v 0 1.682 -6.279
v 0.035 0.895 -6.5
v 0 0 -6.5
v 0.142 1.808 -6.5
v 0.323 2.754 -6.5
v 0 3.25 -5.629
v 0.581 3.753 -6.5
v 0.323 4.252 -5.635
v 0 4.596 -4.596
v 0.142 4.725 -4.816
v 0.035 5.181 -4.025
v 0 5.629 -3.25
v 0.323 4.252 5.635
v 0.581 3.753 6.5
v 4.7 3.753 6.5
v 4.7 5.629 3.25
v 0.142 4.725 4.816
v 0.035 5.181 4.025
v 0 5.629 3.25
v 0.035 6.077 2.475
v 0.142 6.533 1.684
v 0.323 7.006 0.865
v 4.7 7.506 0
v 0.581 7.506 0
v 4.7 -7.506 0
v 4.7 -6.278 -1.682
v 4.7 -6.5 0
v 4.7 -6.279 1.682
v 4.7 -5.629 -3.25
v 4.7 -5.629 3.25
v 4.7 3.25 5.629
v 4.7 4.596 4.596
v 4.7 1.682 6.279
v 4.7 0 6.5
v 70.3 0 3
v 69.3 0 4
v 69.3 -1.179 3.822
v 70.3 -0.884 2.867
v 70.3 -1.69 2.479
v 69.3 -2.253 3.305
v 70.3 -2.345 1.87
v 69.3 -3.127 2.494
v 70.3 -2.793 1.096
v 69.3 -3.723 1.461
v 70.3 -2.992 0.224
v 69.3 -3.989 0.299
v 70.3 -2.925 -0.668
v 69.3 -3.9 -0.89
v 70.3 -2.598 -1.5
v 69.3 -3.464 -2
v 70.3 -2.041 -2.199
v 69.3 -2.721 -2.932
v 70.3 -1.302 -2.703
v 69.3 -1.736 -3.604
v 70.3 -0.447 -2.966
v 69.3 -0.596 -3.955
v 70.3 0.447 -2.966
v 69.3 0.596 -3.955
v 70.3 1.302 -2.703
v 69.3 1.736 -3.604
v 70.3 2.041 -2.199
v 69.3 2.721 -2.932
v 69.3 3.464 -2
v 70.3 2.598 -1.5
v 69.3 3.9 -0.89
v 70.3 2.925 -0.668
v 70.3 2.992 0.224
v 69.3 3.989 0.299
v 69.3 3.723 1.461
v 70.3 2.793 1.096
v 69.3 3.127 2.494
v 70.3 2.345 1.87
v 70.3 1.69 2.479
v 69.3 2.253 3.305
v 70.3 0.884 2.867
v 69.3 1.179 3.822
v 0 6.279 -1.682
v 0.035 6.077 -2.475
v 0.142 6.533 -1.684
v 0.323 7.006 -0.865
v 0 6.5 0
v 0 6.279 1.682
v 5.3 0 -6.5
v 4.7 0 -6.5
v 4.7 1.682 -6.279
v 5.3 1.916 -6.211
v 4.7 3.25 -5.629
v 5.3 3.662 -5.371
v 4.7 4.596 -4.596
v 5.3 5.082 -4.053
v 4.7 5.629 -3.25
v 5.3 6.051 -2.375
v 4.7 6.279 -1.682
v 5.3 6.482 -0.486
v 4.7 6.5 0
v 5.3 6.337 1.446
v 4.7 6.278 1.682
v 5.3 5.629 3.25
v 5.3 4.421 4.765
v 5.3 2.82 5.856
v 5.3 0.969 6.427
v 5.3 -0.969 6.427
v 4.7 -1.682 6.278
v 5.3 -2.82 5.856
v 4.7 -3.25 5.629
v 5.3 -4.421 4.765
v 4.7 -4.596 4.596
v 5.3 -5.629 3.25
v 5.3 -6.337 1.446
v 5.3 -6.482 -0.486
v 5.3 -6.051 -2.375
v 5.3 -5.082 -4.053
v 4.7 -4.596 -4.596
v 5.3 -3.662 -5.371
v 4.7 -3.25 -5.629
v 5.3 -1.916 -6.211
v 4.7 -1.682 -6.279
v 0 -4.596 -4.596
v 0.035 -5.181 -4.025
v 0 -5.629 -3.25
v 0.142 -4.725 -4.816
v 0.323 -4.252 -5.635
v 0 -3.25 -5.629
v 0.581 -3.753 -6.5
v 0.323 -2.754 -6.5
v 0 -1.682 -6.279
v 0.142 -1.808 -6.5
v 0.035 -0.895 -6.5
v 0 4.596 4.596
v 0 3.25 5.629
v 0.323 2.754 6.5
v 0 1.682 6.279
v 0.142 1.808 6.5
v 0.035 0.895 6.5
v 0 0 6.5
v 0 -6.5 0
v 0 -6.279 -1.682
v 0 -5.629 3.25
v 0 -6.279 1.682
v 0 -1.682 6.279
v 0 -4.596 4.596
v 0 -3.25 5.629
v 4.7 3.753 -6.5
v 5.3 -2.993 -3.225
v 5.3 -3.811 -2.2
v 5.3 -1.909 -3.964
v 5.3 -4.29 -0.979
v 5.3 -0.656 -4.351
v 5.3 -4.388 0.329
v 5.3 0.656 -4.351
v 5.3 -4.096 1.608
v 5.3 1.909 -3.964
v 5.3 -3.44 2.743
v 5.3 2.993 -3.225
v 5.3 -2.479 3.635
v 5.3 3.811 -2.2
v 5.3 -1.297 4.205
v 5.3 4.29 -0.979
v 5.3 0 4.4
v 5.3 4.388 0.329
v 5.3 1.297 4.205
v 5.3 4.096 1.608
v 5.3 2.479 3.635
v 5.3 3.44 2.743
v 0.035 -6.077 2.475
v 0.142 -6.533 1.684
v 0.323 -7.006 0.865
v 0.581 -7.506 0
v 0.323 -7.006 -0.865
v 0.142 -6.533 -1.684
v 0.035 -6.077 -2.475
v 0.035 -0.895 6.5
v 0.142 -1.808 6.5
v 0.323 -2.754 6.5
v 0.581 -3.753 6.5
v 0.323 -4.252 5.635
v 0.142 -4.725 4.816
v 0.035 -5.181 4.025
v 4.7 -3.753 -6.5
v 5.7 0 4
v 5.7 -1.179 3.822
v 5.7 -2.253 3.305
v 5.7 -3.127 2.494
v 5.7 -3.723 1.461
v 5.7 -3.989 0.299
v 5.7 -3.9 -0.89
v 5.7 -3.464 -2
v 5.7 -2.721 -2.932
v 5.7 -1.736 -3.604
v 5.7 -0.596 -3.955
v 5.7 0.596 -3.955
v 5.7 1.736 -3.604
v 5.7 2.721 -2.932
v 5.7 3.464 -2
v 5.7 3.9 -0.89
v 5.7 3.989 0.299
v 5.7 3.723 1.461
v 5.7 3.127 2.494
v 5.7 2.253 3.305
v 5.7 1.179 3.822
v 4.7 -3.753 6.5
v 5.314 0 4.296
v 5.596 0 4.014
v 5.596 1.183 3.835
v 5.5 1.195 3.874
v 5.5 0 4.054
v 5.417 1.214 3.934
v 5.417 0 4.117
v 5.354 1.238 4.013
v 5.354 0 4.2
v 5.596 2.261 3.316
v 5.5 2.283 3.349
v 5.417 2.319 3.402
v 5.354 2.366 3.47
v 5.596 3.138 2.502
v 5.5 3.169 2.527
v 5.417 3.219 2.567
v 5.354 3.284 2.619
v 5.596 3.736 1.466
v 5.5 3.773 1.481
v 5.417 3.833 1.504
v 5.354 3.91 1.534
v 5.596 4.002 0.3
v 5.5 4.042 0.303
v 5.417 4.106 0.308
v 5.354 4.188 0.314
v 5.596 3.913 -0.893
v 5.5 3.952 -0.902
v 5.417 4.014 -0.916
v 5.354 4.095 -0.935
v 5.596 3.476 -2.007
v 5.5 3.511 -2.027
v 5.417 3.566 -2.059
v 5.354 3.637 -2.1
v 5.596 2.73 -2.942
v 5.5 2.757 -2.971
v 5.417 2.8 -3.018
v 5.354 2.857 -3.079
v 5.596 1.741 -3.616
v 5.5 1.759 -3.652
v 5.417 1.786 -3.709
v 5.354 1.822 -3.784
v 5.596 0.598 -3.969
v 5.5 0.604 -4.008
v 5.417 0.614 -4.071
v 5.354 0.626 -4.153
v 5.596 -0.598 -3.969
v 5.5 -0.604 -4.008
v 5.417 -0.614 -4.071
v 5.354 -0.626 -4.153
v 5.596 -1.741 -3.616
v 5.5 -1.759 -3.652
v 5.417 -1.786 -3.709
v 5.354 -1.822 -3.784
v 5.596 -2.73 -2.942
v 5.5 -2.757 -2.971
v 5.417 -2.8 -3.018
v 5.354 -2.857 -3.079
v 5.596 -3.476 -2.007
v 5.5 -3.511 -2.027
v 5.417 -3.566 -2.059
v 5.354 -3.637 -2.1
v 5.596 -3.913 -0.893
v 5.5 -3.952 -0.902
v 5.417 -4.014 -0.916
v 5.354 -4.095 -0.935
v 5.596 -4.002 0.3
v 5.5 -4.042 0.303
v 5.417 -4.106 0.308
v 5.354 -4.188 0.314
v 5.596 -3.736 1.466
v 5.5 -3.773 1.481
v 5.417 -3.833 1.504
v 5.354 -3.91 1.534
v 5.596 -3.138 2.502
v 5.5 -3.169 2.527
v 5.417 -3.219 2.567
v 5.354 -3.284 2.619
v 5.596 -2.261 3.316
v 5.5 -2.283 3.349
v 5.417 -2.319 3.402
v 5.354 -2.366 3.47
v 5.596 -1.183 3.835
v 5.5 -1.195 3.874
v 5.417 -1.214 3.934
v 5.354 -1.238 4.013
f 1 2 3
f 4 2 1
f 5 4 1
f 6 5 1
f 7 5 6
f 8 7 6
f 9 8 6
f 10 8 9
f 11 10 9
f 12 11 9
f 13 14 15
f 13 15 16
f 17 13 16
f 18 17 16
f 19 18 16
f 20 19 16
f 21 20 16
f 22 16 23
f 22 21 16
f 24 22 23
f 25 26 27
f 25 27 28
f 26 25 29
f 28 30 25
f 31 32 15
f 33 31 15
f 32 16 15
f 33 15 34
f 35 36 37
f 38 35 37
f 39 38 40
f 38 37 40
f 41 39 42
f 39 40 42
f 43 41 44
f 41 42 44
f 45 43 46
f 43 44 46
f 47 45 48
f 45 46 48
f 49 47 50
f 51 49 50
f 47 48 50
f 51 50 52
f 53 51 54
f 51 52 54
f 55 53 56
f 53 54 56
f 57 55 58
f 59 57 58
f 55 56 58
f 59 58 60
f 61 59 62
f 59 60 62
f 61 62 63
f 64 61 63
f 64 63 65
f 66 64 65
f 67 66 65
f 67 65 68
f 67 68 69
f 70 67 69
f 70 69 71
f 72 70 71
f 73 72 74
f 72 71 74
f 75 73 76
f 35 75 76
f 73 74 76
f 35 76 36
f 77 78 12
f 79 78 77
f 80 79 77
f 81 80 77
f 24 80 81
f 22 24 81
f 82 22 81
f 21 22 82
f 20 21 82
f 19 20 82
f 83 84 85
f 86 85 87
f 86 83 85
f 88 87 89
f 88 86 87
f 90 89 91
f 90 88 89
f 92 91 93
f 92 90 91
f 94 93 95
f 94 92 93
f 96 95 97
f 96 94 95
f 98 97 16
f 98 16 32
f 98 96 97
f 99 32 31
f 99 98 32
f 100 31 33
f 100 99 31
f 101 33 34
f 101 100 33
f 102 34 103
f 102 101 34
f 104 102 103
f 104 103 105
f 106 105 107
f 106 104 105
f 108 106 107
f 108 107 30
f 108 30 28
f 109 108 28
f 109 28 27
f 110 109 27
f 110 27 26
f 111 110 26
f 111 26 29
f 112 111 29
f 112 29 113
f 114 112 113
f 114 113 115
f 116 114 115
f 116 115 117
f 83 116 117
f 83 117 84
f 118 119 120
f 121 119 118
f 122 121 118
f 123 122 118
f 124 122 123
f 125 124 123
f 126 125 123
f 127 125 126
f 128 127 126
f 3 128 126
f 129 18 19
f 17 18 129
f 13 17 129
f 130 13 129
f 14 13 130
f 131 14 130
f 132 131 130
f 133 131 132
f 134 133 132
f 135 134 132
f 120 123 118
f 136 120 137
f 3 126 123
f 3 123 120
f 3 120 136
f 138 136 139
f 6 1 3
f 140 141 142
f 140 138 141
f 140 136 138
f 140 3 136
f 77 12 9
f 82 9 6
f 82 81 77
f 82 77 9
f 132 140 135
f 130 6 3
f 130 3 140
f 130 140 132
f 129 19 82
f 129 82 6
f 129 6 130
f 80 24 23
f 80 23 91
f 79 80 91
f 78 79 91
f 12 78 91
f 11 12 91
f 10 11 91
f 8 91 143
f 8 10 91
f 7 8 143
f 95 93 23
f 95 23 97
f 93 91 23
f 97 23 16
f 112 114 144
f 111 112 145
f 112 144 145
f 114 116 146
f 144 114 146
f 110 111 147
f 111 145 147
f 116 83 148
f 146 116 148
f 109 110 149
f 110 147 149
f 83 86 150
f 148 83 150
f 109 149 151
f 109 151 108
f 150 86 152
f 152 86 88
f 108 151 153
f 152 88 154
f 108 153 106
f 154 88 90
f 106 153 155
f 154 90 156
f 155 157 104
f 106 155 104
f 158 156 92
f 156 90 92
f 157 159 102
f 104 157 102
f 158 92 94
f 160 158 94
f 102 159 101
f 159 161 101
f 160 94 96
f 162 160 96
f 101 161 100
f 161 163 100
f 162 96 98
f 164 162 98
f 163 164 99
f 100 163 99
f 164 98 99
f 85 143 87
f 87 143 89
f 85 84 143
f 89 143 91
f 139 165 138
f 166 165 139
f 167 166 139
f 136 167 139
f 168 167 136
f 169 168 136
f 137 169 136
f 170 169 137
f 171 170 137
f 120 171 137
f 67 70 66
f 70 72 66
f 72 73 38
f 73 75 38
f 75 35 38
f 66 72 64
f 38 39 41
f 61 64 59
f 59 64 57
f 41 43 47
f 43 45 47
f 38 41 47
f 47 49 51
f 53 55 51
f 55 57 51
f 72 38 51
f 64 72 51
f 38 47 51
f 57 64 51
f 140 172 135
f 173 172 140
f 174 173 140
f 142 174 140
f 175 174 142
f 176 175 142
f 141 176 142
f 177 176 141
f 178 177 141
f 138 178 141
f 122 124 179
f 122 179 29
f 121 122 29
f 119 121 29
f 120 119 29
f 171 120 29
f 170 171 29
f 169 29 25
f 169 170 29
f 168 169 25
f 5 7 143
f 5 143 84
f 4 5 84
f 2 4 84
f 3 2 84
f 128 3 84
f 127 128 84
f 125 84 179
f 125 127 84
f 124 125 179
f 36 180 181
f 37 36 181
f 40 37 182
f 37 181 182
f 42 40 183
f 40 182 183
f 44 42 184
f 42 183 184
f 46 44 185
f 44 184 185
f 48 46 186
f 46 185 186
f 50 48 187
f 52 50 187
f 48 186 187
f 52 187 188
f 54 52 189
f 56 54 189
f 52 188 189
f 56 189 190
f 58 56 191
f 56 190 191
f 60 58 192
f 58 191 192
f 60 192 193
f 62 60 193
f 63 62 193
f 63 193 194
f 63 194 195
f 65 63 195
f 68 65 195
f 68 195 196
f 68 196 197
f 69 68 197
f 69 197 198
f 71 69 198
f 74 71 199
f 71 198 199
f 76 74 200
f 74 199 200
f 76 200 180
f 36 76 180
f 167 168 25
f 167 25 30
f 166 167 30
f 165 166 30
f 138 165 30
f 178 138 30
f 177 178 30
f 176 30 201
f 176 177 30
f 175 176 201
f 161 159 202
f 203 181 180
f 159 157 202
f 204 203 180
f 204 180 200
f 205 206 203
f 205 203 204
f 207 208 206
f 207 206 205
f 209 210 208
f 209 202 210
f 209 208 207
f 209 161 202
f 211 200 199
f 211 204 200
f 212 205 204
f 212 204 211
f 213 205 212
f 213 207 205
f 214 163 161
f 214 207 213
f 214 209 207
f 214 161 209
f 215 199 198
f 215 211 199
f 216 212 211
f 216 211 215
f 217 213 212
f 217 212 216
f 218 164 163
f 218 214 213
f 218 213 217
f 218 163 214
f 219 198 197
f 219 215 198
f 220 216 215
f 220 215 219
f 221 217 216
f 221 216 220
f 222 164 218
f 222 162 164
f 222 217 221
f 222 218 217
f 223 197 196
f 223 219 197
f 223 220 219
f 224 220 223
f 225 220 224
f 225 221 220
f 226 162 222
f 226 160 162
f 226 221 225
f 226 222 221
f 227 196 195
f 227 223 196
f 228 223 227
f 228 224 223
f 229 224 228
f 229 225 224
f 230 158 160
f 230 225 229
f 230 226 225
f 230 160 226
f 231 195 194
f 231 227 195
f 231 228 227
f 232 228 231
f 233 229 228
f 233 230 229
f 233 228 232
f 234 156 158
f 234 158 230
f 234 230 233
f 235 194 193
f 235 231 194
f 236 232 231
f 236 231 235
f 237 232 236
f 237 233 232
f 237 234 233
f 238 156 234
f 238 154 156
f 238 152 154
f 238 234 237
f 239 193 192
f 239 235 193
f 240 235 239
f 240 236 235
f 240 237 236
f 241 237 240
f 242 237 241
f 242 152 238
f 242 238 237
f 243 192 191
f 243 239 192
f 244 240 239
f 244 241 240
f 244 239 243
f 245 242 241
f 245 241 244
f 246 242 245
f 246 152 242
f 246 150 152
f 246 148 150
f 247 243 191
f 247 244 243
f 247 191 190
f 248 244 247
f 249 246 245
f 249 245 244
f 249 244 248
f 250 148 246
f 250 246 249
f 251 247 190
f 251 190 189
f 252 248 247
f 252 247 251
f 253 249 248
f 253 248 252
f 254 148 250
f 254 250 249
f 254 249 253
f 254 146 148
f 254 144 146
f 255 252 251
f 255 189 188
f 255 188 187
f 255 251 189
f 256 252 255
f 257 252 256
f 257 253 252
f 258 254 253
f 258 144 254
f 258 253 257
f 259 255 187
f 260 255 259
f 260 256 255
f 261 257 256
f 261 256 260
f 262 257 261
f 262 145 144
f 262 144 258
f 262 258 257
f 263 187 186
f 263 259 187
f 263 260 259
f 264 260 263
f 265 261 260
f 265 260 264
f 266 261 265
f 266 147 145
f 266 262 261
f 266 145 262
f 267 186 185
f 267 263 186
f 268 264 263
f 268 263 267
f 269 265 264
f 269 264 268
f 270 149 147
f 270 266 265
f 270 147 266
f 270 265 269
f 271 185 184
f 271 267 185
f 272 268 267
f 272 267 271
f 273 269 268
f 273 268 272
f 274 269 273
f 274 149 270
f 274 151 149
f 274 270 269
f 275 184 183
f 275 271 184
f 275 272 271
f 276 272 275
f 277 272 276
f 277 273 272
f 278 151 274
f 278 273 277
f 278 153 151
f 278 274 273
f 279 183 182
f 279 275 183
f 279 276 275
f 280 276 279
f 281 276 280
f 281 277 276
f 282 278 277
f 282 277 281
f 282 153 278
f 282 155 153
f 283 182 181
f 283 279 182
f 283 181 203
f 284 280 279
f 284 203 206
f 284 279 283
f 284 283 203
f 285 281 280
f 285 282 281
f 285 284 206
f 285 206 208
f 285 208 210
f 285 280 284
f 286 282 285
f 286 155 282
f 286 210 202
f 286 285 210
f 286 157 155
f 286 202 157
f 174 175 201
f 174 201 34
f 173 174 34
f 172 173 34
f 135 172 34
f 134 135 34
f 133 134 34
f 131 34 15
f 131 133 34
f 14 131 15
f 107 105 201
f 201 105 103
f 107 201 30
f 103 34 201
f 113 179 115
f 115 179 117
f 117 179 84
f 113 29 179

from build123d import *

# Parameters (mm, degrees)
EXTRUDE_365_DEPTH = 5.3
SKETCH_4_W        = 0.6
SKETCH_4_H        = 11.005553499
CHAMFER_2062_SIZE = 1
FILLET_2107_R     = 0.4


with BuildPart() as part:
    # 草图1 → Extrude 365 (new body)
    with BuildSketch(Plane(origin=(0, 0, 0), x_dir=(0, 0, -1), z_dir=(1, 0, 0))):
        Polygon((6.5, 3.75277675), (6.5, -3.75277675), (0, -7.505553499), (-6.5, -3.75277675), (-6.5, 3.75277675), (0, 7.505553499), align=None)
    extrude(amount=EXTRUDE_365_DEPTH)

    # 草图2 → 凸台-旋转1 (revolve)
    with BuildSketch(Plane.XY, mode=Mode.PRIVATE) as revolve_1_sk:
        Polygon((0, 0), (70.3, 0), (70.3, 2.9175), (70.3, 4), (7.791693541, 4), (0, 4), align=None)
    revolve(revolve_1_sk.sketch.rotate(Axis((0, 0, 0), (1, 0, 0)), 90), axis=Axis((0, 0, 0), (1, 0, 0)))

    # 草图3 → 切除-旋转1 (revolve, cut)
    with BuildSketch(Plane.XY):
        Polygon((0, 6.5), (3.46730793, 12.505553499), (3.46730793, 17.505553499), (-10, 17.505553499), (-10, 6.5), align=None)
    revolve(axis=Axis((0, 0, 0), (1, 0, 0)), mode=Mode.SUBTRACT)

    # 草图5 → 切除-旋转2 (revolve, cut)
    with BuildSketch(Plane.XY):
        Polygon((5.3, 6.5), (1.83269207, 12.505553499), (1.83269207, 17.505553499), (11.83269207, 17.505553499), (11.83269207, 6.5), align=None)
    revolve(axis=Axis((0, 0, 0), (1, 0, 0)), mode=Mode.SUBTRACT)

    # 草图4 → 切除-旋转3 (revolve, cut)
    with BuildSketch(Plane.XY, mode=Mode.PRIVATE) as cut_revolve_3_sk:
        with Locations((5, 12.00277675)):
            Rectangle(SKETCH_4_W, SKETCH_4_H)
    revolve(cut_revolve_3_sk.sketch.rotate(Axis((0, 0, 0), (1, 0, 0)), 270), axis=Axis((0, 0, 0), (1, 0, 0)), mode=Mode.SUBTRACT)

    # Chamfer 2062
    chamfer_2062_edges = [part.edges().sort_by_distance(p)[0] for p in [
        (70.3, 0, -4),
    ]]
    chamfer(chamfer_2062_edges, length=CHAMFER_2062_SIZE)

    # Fillet 2107
    fillet_2107_edges = [part.edges().sort_by_distance(p)[0] for p in [
        (5.3, 0, -4),
    ]]
    fillet(fillet_2107_edges, radius=FILLET_2107_R)


solid = part.part
